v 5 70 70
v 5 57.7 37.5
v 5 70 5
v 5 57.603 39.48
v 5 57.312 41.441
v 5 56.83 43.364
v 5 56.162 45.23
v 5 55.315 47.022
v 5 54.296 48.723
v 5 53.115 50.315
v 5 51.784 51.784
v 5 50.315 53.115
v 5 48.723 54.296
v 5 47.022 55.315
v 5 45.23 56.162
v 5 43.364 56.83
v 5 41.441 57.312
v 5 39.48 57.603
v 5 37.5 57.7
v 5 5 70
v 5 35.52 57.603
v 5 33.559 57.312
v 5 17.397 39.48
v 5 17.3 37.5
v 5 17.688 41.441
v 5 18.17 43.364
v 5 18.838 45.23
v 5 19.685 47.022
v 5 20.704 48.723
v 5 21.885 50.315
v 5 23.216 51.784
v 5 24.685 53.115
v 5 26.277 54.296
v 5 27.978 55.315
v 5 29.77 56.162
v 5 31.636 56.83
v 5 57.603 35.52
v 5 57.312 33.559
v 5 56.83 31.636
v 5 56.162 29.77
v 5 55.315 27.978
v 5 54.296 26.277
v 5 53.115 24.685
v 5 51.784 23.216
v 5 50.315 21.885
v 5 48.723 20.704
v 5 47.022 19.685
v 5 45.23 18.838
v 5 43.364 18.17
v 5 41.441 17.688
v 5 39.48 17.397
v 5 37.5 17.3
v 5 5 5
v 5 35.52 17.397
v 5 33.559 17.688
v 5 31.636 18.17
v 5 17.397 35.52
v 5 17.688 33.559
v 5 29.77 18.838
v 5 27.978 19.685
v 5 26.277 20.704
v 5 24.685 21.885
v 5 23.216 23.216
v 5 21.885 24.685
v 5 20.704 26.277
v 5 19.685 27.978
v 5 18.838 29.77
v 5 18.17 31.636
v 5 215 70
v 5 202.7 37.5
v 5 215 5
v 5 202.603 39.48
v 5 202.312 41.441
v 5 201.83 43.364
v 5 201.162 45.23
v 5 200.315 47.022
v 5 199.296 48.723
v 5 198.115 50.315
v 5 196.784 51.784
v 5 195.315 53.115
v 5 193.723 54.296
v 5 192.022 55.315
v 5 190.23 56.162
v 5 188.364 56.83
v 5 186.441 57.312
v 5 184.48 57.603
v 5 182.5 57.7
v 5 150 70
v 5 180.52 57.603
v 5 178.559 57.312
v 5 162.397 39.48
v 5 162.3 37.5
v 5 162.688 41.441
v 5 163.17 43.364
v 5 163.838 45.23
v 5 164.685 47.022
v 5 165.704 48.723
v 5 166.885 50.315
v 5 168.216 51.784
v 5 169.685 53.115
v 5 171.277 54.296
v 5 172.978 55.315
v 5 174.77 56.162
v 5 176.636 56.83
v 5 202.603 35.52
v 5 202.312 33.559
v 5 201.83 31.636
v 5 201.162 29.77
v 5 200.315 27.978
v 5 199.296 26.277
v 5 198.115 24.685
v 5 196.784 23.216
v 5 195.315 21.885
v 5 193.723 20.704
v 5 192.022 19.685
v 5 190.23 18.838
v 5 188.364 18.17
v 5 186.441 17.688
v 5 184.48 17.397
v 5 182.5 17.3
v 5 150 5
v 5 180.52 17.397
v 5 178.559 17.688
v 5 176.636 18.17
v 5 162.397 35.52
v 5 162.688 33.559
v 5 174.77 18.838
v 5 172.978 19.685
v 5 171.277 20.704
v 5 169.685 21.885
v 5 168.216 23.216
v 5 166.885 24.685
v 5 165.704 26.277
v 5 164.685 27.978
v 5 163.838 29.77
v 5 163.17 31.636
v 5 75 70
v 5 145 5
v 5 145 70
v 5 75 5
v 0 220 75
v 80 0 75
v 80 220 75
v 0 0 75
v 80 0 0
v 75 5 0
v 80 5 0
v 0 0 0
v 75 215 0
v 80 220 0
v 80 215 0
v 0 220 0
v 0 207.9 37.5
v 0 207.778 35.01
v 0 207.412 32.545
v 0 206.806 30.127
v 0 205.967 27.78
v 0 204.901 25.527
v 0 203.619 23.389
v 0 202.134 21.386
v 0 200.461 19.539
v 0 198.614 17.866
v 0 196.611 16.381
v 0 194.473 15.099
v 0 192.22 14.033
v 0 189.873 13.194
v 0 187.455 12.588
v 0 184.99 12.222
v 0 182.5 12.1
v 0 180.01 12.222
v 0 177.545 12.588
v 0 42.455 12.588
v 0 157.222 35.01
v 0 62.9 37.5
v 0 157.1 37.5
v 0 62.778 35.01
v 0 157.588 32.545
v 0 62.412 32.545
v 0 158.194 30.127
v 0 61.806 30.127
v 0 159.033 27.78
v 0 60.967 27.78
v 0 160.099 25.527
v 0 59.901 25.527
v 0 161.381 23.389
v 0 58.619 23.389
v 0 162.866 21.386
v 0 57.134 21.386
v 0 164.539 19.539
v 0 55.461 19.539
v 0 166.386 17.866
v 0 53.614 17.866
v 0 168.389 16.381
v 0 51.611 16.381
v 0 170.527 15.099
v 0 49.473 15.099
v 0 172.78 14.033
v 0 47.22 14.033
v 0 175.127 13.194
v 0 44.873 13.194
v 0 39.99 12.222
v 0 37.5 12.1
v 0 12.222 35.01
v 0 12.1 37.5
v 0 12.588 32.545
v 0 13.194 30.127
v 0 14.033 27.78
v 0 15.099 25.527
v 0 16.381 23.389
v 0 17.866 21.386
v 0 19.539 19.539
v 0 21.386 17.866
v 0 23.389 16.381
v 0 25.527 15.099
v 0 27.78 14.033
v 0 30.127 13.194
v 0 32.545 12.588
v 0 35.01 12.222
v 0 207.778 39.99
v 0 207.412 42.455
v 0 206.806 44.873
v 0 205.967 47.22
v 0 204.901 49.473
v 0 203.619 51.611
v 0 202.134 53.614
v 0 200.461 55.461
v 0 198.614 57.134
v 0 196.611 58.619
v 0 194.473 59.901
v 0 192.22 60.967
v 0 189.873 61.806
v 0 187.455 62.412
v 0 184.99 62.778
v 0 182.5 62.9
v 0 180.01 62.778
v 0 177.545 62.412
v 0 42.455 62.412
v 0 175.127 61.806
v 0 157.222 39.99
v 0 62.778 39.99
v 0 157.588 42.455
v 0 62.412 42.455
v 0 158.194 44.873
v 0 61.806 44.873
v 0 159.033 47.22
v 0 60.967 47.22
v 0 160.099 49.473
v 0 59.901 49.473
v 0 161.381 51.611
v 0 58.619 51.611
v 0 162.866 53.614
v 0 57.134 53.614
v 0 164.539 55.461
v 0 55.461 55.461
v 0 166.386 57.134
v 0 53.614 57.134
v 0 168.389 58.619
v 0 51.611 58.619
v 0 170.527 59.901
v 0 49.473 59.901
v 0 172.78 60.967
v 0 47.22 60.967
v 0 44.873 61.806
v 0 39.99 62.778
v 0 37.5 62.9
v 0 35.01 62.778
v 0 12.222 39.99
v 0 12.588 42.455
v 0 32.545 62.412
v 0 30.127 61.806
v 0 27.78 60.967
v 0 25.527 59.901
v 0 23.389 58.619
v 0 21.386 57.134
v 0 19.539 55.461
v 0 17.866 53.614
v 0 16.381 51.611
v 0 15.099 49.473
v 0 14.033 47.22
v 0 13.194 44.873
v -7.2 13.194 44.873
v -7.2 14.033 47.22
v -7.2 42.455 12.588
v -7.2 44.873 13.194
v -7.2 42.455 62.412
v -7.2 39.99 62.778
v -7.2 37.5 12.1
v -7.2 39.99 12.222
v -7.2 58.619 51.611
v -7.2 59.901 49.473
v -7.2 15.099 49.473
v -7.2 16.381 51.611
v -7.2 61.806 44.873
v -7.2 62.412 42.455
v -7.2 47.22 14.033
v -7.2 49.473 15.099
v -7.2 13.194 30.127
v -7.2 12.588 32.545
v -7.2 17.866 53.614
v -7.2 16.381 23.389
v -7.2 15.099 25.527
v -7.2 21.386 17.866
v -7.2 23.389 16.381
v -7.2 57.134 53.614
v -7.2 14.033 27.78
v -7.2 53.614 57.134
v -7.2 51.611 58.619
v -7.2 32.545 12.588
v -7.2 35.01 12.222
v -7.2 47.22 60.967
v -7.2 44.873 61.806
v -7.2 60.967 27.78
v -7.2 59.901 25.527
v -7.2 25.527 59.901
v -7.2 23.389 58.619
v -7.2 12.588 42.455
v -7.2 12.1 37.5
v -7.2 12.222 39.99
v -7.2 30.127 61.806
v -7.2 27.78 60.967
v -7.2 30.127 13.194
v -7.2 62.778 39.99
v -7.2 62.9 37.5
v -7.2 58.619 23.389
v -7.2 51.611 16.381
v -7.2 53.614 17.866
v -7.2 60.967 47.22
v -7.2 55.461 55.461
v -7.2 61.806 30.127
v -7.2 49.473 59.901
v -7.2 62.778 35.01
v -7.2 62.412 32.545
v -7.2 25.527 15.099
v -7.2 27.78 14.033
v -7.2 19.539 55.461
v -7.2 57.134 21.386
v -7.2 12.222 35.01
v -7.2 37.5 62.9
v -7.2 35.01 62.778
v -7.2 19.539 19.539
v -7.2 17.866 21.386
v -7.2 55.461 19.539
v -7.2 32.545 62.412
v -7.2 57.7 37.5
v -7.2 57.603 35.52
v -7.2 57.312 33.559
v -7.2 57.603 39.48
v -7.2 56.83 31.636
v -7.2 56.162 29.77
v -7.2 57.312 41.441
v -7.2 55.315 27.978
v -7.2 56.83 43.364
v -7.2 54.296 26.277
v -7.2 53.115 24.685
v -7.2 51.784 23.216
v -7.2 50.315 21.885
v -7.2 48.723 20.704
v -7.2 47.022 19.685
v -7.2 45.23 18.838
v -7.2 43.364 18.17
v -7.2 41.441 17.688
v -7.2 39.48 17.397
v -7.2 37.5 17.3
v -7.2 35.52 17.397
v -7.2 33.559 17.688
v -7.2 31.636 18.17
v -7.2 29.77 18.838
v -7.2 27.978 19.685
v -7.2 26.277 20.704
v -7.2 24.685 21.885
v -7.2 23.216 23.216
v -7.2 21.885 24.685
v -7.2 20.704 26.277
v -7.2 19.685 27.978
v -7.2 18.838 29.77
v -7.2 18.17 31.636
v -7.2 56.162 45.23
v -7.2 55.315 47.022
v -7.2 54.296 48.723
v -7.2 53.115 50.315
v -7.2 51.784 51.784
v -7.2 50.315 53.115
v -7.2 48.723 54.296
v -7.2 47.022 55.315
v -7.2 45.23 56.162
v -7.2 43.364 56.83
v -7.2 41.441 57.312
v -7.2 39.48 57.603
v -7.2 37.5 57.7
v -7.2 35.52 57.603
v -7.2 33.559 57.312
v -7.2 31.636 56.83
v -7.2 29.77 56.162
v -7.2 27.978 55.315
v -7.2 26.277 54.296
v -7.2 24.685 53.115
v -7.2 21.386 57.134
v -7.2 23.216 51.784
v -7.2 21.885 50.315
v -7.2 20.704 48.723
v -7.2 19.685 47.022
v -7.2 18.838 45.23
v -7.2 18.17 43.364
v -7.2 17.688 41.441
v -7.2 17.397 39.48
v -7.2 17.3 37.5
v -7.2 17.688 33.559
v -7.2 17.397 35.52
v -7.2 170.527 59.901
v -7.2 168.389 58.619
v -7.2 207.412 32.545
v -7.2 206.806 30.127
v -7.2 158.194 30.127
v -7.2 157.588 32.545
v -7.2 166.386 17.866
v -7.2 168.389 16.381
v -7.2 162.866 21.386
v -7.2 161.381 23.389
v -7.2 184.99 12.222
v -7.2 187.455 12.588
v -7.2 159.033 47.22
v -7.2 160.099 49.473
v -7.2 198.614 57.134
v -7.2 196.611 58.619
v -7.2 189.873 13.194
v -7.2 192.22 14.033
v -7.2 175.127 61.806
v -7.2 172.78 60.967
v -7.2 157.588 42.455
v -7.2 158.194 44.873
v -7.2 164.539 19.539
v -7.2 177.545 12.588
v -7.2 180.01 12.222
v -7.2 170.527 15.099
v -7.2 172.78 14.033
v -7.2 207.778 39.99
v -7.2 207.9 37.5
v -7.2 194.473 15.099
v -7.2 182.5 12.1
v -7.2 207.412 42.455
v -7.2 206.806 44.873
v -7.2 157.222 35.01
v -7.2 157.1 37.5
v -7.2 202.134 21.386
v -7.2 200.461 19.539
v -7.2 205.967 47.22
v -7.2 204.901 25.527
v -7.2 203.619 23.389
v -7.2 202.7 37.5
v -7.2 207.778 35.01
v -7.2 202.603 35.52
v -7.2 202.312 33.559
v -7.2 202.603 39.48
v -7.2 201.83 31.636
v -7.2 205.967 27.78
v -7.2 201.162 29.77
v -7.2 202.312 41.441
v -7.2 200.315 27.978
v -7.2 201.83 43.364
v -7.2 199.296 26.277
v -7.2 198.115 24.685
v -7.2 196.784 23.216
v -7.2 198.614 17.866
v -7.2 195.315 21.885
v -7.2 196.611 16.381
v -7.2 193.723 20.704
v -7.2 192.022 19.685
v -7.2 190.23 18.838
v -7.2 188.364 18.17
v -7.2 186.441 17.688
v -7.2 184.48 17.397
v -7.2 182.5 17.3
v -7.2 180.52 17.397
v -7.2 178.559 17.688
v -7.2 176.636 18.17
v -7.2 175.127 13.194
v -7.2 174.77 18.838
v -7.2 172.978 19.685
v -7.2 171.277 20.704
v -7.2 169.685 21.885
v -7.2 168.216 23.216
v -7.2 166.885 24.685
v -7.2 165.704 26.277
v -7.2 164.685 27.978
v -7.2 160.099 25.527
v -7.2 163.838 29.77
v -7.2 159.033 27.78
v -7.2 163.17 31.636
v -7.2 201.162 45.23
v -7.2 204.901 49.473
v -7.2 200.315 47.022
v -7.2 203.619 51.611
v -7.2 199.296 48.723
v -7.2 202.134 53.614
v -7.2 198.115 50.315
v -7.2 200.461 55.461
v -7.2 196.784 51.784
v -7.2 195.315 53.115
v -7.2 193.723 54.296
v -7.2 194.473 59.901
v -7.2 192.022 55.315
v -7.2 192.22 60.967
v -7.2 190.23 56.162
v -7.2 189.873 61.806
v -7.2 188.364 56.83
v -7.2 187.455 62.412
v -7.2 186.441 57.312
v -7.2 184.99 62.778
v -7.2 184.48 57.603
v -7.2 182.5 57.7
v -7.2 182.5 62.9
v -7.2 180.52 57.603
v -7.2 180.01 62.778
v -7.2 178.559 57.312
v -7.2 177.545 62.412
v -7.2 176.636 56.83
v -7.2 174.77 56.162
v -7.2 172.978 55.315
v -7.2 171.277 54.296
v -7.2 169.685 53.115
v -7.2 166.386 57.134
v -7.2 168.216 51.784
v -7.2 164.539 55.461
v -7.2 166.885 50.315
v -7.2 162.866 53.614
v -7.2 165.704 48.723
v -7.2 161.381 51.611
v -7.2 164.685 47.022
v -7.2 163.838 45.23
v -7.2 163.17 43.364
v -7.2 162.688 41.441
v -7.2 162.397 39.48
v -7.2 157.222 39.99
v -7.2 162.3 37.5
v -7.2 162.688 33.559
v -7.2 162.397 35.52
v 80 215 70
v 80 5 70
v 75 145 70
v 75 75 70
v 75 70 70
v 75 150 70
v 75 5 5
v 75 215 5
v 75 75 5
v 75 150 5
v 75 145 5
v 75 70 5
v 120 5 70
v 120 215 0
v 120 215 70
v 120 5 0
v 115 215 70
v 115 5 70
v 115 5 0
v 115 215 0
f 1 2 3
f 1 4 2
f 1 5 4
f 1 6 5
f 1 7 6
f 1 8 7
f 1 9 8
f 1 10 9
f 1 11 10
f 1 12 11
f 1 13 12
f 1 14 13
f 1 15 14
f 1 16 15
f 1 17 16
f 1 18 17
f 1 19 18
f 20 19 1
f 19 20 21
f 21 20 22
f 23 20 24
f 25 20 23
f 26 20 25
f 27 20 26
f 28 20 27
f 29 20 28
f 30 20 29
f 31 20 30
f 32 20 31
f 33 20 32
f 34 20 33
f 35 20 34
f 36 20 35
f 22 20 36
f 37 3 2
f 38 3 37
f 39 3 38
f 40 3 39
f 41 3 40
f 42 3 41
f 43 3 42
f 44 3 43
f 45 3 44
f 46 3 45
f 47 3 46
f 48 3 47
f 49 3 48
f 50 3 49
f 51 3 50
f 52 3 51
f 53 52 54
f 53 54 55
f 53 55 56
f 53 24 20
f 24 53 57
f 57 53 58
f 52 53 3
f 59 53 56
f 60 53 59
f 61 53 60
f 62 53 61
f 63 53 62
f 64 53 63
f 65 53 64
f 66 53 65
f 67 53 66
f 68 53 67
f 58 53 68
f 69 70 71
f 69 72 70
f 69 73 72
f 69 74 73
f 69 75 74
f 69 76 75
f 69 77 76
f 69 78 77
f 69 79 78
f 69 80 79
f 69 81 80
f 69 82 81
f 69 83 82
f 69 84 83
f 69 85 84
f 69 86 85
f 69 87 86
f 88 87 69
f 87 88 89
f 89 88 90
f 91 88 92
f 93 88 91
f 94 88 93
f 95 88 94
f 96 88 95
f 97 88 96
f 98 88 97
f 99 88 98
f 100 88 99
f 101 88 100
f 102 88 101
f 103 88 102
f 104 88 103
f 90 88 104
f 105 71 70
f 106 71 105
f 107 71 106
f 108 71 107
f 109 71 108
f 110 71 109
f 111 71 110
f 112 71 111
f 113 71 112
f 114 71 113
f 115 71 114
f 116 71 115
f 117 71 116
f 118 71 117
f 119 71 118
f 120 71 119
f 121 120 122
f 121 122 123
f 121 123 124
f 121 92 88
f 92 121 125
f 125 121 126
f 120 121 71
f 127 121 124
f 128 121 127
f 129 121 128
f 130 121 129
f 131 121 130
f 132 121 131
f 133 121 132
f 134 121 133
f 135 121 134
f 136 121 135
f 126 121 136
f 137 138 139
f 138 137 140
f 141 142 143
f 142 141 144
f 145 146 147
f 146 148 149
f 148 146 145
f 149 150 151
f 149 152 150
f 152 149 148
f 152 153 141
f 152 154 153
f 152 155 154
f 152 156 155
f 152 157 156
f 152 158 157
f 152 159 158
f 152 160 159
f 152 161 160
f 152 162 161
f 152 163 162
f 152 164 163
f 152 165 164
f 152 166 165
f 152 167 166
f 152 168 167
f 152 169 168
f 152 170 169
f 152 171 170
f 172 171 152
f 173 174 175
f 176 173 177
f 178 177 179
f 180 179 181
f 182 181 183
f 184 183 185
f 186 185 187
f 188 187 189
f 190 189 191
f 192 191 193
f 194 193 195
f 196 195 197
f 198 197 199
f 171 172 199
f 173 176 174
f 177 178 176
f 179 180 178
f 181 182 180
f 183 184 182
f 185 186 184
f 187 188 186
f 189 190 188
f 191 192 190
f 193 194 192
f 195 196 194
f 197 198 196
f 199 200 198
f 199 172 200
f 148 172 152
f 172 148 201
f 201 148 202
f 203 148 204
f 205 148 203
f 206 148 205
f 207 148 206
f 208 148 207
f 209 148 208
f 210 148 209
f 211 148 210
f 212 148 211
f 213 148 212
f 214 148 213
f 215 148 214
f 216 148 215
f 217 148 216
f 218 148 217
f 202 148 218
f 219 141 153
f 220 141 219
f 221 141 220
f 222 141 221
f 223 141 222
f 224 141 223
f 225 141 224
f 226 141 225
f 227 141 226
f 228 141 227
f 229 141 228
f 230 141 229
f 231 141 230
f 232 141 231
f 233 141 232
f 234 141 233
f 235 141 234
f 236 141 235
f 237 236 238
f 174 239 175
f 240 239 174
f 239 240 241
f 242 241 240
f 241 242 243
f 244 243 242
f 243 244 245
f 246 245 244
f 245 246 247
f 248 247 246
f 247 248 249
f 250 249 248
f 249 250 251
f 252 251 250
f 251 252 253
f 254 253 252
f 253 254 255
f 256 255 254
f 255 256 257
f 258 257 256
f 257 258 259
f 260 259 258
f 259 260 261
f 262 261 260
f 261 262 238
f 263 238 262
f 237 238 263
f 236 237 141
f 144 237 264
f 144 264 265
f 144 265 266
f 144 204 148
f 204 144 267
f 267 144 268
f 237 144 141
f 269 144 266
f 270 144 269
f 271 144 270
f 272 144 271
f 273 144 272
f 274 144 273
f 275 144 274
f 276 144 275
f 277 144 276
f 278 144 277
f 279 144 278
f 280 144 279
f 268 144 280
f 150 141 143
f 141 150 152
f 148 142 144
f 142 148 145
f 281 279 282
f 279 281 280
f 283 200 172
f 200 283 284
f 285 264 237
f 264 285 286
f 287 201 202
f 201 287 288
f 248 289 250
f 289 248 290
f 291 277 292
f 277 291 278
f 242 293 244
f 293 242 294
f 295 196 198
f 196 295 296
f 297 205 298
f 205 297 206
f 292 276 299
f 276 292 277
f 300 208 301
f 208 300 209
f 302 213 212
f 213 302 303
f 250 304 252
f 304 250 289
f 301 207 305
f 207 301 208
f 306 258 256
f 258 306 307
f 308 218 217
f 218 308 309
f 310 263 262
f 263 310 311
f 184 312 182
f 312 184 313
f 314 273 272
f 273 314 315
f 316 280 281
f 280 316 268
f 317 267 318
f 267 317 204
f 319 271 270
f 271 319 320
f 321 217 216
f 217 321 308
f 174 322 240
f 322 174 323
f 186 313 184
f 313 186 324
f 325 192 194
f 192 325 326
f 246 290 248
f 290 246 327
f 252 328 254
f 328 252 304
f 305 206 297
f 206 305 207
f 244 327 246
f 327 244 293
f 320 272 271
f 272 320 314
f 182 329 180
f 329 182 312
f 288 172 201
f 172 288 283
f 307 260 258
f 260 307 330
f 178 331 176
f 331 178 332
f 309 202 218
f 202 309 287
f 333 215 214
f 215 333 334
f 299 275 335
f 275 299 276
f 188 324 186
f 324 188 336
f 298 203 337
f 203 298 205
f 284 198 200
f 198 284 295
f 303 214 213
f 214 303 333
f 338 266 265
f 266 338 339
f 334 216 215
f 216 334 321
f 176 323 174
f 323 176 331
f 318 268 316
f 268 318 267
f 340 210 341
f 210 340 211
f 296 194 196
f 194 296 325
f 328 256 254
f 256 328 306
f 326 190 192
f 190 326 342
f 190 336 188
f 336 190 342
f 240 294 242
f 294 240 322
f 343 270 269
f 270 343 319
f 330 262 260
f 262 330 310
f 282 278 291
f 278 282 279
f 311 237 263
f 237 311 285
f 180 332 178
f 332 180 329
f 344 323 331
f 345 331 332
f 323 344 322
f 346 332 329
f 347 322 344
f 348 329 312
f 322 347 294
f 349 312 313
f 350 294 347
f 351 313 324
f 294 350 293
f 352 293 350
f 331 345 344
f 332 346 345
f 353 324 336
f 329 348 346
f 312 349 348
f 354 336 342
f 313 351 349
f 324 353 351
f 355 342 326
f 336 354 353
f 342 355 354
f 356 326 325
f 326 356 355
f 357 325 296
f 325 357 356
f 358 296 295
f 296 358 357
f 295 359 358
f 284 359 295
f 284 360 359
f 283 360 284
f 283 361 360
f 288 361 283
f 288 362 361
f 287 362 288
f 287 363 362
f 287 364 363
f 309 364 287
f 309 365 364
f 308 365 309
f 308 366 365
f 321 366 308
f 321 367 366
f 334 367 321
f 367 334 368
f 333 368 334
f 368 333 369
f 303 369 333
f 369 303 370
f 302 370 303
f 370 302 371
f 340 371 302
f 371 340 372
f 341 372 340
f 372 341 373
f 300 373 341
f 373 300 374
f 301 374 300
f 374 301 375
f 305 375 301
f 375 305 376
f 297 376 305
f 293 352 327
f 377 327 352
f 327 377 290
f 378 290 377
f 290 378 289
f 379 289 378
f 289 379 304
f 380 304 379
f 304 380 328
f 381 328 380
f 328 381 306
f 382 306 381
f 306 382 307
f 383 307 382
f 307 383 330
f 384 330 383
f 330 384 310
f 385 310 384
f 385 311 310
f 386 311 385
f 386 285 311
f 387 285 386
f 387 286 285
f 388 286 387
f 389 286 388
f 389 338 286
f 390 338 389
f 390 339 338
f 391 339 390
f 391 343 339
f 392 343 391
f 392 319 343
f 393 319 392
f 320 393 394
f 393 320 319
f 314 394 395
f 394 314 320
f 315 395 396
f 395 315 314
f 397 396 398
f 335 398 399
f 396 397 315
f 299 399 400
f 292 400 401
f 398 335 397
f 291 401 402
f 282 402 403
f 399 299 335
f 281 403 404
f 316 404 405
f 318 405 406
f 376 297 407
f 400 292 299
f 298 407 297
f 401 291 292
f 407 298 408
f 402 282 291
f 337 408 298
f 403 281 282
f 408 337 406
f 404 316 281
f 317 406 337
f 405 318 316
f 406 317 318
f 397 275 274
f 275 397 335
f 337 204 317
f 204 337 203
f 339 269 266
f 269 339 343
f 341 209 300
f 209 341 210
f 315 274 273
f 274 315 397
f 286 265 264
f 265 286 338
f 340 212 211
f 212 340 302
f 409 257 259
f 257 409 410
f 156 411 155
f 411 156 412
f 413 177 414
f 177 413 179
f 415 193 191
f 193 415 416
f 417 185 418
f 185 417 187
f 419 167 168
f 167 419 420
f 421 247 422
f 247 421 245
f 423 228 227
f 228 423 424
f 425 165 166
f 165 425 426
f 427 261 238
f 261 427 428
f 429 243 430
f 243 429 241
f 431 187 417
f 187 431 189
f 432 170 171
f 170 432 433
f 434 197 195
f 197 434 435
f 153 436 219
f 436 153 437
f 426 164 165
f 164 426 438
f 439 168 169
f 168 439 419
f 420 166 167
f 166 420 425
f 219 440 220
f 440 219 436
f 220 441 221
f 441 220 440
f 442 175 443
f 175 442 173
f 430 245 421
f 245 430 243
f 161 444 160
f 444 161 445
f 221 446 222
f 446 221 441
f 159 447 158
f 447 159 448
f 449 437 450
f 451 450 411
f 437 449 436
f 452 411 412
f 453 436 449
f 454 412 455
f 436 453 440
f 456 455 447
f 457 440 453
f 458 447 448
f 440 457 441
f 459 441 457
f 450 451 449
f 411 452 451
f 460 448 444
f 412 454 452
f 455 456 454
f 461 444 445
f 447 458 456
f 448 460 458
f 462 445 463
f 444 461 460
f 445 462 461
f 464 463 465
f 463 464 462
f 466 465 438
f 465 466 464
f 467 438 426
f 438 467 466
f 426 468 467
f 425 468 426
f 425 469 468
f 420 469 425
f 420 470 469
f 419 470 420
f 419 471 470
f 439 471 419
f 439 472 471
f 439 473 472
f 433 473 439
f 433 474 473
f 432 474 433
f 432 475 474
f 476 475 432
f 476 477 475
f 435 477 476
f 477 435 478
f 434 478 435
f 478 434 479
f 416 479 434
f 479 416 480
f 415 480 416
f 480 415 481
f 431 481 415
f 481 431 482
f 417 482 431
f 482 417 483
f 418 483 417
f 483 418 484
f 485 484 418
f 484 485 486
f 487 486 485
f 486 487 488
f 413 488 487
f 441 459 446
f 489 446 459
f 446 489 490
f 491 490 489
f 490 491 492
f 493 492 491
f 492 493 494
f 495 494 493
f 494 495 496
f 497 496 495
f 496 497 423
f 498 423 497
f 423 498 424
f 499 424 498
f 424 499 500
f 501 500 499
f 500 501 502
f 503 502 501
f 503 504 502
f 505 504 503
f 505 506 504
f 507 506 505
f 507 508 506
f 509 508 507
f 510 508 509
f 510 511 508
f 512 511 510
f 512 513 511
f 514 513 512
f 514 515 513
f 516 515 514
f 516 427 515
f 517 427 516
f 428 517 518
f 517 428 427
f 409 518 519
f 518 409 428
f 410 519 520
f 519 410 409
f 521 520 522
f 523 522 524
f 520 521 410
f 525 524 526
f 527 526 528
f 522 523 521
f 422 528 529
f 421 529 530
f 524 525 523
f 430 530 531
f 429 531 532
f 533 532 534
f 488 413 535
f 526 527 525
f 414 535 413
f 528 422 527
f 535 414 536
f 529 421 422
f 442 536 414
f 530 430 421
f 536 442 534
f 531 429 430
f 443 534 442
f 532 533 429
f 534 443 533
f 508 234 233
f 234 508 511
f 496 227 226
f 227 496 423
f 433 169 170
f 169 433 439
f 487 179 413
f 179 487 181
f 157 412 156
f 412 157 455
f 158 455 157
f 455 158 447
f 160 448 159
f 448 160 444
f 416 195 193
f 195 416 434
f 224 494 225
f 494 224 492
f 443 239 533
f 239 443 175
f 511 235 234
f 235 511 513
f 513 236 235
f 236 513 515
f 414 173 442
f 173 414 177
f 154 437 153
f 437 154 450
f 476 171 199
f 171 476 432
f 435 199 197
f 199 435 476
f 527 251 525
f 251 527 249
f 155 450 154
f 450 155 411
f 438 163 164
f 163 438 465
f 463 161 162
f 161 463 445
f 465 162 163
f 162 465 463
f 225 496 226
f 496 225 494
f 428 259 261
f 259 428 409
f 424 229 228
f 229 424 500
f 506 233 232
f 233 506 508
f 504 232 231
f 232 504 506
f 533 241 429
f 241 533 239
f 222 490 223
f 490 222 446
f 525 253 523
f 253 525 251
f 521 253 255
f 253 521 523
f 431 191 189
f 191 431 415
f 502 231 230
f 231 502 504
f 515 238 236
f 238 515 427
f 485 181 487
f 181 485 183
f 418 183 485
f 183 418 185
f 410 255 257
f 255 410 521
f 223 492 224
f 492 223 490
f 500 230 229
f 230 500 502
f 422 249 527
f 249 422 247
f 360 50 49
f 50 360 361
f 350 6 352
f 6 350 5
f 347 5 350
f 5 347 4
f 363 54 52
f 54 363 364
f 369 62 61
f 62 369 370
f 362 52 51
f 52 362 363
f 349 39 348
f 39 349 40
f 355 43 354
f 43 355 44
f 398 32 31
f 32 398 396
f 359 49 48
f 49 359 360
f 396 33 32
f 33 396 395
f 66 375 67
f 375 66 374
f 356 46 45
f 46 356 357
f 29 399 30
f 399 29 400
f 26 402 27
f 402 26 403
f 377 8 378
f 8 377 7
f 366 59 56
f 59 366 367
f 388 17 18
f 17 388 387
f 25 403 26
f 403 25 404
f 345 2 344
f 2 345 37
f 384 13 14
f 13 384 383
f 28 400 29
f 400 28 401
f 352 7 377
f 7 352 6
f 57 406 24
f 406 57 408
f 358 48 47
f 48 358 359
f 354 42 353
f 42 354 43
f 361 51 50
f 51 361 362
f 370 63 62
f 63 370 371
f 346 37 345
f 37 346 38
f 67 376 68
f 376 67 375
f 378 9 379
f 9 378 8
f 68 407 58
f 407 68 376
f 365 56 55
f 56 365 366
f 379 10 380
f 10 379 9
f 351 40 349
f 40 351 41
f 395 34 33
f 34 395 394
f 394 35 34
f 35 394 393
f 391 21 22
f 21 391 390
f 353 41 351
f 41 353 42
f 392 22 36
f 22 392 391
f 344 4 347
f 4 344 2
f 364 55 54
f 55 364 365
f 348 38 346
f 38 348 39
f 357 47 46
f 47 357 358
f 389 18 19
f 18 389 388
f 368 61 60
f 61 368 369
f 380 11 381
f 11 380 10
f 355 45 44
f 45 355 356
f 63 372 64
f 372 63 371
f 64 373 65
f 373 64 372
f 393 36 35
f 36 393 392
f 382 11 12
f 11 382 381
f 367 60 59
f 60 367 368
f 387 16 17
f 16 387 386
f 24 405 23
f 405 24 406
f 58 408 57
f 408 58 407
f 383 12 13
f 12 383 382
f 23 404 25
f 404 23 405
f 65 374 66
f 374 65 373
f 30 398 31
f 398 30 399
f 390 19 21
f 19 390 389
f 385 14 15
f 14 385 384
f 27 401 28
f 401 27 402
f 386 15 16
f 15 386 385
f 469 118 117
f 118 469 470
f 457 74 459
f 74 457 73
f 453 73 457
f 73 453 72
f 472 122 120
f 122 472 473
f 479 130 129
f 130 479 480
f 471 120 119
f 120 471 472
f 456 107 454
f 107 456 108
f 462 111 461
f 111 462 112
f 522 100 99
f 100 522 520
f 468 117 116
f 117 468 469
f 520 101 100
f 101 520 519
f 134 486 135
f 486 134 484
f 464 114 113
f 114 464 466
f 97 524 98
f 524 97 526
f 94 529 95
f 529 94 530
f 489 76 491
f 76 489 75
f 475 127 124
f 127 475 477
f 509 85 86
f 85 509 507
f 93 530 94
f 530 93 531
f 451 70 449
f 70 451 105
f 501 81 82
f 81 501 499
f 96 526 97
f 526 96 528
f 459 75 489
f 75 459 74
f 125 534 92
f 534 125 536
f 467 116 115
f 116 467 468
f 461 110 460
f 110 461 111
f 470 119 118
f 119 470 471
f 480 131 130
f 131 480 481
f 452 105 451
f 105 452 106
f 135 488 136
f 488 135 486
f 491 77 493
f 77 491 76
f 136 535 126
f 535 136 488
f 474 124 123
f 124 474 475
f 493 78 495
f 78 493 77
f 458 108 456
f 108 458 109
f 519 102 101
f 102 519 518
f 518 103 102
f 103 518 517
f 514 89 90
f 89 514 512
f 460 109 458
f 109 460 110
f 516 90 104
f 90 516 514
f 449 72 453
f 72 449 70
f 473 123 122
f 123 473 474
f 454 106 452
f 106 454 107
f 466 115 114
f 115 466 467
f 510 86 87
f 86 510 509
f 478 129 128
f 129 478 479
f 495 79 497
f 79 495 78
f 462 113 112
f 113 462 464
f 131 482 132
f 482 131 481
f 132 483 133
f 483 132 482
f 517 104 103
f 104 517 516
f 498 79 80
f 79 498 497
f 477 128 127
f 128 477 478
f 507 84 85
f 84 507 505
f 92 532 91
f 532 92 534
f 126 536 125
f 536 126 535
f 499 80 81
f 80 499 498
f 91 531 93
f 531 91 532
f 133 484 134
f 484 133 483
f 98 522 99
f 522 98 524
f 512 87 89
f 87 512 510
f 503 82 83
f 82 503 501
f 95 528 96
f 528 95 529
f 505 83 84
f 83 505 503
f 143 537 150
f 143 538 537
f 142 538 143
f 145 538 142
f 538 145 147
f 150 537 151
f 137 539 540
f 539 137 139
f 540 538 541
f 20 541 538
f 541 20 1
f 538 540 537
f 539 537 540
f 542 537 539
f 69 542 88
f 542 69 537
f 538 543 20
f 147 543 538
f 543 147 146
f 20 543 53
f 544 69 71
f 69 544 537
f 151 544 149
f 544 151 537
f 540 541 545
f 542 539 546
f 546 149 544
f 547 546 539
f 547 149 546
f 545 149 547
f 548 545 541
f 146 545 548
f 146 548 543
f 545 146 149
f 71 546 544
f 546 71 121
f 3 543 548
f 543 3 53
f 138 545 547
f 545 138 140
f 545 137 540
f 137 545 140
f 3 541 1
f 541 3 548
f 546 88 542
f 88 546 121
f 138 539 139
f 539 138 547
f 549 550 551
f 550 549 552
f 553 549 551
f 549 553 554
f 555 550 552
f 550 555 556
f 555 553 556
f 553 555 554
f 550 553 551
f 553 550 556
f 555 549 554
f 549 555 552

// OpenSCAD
$fn = 64;
// box material thickness (1/2" plywood)
bxmthk = 5;
// width of box
bxw = 220;
// height of box
bxh = 75;  //178;
// depth of box
bxd = 80;
//inner section height
insh = bxh-bxmthk-bxmthk;
//inner section depth
insd = bxd-bxmthk-bxmthk;
// speaker hole diameter
spkhd = 40.4;
// speaker mount diameter
spkmd = 50.8;

module frontpanel() {
    color("maroon") cube([bxmthk,bxw,bxh]);
    translate([-7.2, bxh/2, bxh/2])
        rotate([0,90,0]) cylinder(d=spkmd,h=7.2);
    translate([-7.2, bxw - bxh/2, bxh/2])
        rotate([0,90,0]) cylinder(d=spkmd,h=7.2);
}

// front face
difference() {
    frontpanel();
    translate([-1,insh/2 + bxmthk,insh/2 + bxmthk])
        rotate([0,90,0]) cylinder(d=spkhd,h=400,center=true);
    translate([-1,bxw - insh/2 - bxmthk,insh/2 + bxmthk])
        rotate([0,90,0]) cylinder(d=spkhd,h=400,center=true);
}

// top
translate([bxmthk,0,bxh-bxmthk])
    color("red")
        cube([bxd-bxmthk,bxw,bxmthk]);
// left and right sides
translate([bxmthk,0,0])
    color("yellow")
        cube([bxd-bxmthk,bxmthk,bxh-bxmthk]);
translate([bxmthk,bxw-bxmthk,0])
    color("yellow")
        cube([bxd-bxmthk,bxmthk,bxh-bxmthk]);
// inner sections
translate([bxmthk,insh+bxmthk,bxmthk])
    color("gray")
        cube([insd,bxmthk,insh]);
translate([bxmthk,bxw-insh-bxmthk-bxmthk,bxmthk])
    color("gray")
        cube([insd,bxmthk,insh]);

// bottom and back
translate([bxmthk,bxmthk,0])
    color([0,0,100,1.0])
        cube([insd,bxw-bxmthk-bxmthk,bxmthk]);
translate([40+insd+bxmthk,bxmthk,0])
    color([0,100,0,0.3])
        cube([bxmthk,bxw-bxmthk-bxmthk,bxh-bxmthk]);

echo(insh=insh,insd=insd);
